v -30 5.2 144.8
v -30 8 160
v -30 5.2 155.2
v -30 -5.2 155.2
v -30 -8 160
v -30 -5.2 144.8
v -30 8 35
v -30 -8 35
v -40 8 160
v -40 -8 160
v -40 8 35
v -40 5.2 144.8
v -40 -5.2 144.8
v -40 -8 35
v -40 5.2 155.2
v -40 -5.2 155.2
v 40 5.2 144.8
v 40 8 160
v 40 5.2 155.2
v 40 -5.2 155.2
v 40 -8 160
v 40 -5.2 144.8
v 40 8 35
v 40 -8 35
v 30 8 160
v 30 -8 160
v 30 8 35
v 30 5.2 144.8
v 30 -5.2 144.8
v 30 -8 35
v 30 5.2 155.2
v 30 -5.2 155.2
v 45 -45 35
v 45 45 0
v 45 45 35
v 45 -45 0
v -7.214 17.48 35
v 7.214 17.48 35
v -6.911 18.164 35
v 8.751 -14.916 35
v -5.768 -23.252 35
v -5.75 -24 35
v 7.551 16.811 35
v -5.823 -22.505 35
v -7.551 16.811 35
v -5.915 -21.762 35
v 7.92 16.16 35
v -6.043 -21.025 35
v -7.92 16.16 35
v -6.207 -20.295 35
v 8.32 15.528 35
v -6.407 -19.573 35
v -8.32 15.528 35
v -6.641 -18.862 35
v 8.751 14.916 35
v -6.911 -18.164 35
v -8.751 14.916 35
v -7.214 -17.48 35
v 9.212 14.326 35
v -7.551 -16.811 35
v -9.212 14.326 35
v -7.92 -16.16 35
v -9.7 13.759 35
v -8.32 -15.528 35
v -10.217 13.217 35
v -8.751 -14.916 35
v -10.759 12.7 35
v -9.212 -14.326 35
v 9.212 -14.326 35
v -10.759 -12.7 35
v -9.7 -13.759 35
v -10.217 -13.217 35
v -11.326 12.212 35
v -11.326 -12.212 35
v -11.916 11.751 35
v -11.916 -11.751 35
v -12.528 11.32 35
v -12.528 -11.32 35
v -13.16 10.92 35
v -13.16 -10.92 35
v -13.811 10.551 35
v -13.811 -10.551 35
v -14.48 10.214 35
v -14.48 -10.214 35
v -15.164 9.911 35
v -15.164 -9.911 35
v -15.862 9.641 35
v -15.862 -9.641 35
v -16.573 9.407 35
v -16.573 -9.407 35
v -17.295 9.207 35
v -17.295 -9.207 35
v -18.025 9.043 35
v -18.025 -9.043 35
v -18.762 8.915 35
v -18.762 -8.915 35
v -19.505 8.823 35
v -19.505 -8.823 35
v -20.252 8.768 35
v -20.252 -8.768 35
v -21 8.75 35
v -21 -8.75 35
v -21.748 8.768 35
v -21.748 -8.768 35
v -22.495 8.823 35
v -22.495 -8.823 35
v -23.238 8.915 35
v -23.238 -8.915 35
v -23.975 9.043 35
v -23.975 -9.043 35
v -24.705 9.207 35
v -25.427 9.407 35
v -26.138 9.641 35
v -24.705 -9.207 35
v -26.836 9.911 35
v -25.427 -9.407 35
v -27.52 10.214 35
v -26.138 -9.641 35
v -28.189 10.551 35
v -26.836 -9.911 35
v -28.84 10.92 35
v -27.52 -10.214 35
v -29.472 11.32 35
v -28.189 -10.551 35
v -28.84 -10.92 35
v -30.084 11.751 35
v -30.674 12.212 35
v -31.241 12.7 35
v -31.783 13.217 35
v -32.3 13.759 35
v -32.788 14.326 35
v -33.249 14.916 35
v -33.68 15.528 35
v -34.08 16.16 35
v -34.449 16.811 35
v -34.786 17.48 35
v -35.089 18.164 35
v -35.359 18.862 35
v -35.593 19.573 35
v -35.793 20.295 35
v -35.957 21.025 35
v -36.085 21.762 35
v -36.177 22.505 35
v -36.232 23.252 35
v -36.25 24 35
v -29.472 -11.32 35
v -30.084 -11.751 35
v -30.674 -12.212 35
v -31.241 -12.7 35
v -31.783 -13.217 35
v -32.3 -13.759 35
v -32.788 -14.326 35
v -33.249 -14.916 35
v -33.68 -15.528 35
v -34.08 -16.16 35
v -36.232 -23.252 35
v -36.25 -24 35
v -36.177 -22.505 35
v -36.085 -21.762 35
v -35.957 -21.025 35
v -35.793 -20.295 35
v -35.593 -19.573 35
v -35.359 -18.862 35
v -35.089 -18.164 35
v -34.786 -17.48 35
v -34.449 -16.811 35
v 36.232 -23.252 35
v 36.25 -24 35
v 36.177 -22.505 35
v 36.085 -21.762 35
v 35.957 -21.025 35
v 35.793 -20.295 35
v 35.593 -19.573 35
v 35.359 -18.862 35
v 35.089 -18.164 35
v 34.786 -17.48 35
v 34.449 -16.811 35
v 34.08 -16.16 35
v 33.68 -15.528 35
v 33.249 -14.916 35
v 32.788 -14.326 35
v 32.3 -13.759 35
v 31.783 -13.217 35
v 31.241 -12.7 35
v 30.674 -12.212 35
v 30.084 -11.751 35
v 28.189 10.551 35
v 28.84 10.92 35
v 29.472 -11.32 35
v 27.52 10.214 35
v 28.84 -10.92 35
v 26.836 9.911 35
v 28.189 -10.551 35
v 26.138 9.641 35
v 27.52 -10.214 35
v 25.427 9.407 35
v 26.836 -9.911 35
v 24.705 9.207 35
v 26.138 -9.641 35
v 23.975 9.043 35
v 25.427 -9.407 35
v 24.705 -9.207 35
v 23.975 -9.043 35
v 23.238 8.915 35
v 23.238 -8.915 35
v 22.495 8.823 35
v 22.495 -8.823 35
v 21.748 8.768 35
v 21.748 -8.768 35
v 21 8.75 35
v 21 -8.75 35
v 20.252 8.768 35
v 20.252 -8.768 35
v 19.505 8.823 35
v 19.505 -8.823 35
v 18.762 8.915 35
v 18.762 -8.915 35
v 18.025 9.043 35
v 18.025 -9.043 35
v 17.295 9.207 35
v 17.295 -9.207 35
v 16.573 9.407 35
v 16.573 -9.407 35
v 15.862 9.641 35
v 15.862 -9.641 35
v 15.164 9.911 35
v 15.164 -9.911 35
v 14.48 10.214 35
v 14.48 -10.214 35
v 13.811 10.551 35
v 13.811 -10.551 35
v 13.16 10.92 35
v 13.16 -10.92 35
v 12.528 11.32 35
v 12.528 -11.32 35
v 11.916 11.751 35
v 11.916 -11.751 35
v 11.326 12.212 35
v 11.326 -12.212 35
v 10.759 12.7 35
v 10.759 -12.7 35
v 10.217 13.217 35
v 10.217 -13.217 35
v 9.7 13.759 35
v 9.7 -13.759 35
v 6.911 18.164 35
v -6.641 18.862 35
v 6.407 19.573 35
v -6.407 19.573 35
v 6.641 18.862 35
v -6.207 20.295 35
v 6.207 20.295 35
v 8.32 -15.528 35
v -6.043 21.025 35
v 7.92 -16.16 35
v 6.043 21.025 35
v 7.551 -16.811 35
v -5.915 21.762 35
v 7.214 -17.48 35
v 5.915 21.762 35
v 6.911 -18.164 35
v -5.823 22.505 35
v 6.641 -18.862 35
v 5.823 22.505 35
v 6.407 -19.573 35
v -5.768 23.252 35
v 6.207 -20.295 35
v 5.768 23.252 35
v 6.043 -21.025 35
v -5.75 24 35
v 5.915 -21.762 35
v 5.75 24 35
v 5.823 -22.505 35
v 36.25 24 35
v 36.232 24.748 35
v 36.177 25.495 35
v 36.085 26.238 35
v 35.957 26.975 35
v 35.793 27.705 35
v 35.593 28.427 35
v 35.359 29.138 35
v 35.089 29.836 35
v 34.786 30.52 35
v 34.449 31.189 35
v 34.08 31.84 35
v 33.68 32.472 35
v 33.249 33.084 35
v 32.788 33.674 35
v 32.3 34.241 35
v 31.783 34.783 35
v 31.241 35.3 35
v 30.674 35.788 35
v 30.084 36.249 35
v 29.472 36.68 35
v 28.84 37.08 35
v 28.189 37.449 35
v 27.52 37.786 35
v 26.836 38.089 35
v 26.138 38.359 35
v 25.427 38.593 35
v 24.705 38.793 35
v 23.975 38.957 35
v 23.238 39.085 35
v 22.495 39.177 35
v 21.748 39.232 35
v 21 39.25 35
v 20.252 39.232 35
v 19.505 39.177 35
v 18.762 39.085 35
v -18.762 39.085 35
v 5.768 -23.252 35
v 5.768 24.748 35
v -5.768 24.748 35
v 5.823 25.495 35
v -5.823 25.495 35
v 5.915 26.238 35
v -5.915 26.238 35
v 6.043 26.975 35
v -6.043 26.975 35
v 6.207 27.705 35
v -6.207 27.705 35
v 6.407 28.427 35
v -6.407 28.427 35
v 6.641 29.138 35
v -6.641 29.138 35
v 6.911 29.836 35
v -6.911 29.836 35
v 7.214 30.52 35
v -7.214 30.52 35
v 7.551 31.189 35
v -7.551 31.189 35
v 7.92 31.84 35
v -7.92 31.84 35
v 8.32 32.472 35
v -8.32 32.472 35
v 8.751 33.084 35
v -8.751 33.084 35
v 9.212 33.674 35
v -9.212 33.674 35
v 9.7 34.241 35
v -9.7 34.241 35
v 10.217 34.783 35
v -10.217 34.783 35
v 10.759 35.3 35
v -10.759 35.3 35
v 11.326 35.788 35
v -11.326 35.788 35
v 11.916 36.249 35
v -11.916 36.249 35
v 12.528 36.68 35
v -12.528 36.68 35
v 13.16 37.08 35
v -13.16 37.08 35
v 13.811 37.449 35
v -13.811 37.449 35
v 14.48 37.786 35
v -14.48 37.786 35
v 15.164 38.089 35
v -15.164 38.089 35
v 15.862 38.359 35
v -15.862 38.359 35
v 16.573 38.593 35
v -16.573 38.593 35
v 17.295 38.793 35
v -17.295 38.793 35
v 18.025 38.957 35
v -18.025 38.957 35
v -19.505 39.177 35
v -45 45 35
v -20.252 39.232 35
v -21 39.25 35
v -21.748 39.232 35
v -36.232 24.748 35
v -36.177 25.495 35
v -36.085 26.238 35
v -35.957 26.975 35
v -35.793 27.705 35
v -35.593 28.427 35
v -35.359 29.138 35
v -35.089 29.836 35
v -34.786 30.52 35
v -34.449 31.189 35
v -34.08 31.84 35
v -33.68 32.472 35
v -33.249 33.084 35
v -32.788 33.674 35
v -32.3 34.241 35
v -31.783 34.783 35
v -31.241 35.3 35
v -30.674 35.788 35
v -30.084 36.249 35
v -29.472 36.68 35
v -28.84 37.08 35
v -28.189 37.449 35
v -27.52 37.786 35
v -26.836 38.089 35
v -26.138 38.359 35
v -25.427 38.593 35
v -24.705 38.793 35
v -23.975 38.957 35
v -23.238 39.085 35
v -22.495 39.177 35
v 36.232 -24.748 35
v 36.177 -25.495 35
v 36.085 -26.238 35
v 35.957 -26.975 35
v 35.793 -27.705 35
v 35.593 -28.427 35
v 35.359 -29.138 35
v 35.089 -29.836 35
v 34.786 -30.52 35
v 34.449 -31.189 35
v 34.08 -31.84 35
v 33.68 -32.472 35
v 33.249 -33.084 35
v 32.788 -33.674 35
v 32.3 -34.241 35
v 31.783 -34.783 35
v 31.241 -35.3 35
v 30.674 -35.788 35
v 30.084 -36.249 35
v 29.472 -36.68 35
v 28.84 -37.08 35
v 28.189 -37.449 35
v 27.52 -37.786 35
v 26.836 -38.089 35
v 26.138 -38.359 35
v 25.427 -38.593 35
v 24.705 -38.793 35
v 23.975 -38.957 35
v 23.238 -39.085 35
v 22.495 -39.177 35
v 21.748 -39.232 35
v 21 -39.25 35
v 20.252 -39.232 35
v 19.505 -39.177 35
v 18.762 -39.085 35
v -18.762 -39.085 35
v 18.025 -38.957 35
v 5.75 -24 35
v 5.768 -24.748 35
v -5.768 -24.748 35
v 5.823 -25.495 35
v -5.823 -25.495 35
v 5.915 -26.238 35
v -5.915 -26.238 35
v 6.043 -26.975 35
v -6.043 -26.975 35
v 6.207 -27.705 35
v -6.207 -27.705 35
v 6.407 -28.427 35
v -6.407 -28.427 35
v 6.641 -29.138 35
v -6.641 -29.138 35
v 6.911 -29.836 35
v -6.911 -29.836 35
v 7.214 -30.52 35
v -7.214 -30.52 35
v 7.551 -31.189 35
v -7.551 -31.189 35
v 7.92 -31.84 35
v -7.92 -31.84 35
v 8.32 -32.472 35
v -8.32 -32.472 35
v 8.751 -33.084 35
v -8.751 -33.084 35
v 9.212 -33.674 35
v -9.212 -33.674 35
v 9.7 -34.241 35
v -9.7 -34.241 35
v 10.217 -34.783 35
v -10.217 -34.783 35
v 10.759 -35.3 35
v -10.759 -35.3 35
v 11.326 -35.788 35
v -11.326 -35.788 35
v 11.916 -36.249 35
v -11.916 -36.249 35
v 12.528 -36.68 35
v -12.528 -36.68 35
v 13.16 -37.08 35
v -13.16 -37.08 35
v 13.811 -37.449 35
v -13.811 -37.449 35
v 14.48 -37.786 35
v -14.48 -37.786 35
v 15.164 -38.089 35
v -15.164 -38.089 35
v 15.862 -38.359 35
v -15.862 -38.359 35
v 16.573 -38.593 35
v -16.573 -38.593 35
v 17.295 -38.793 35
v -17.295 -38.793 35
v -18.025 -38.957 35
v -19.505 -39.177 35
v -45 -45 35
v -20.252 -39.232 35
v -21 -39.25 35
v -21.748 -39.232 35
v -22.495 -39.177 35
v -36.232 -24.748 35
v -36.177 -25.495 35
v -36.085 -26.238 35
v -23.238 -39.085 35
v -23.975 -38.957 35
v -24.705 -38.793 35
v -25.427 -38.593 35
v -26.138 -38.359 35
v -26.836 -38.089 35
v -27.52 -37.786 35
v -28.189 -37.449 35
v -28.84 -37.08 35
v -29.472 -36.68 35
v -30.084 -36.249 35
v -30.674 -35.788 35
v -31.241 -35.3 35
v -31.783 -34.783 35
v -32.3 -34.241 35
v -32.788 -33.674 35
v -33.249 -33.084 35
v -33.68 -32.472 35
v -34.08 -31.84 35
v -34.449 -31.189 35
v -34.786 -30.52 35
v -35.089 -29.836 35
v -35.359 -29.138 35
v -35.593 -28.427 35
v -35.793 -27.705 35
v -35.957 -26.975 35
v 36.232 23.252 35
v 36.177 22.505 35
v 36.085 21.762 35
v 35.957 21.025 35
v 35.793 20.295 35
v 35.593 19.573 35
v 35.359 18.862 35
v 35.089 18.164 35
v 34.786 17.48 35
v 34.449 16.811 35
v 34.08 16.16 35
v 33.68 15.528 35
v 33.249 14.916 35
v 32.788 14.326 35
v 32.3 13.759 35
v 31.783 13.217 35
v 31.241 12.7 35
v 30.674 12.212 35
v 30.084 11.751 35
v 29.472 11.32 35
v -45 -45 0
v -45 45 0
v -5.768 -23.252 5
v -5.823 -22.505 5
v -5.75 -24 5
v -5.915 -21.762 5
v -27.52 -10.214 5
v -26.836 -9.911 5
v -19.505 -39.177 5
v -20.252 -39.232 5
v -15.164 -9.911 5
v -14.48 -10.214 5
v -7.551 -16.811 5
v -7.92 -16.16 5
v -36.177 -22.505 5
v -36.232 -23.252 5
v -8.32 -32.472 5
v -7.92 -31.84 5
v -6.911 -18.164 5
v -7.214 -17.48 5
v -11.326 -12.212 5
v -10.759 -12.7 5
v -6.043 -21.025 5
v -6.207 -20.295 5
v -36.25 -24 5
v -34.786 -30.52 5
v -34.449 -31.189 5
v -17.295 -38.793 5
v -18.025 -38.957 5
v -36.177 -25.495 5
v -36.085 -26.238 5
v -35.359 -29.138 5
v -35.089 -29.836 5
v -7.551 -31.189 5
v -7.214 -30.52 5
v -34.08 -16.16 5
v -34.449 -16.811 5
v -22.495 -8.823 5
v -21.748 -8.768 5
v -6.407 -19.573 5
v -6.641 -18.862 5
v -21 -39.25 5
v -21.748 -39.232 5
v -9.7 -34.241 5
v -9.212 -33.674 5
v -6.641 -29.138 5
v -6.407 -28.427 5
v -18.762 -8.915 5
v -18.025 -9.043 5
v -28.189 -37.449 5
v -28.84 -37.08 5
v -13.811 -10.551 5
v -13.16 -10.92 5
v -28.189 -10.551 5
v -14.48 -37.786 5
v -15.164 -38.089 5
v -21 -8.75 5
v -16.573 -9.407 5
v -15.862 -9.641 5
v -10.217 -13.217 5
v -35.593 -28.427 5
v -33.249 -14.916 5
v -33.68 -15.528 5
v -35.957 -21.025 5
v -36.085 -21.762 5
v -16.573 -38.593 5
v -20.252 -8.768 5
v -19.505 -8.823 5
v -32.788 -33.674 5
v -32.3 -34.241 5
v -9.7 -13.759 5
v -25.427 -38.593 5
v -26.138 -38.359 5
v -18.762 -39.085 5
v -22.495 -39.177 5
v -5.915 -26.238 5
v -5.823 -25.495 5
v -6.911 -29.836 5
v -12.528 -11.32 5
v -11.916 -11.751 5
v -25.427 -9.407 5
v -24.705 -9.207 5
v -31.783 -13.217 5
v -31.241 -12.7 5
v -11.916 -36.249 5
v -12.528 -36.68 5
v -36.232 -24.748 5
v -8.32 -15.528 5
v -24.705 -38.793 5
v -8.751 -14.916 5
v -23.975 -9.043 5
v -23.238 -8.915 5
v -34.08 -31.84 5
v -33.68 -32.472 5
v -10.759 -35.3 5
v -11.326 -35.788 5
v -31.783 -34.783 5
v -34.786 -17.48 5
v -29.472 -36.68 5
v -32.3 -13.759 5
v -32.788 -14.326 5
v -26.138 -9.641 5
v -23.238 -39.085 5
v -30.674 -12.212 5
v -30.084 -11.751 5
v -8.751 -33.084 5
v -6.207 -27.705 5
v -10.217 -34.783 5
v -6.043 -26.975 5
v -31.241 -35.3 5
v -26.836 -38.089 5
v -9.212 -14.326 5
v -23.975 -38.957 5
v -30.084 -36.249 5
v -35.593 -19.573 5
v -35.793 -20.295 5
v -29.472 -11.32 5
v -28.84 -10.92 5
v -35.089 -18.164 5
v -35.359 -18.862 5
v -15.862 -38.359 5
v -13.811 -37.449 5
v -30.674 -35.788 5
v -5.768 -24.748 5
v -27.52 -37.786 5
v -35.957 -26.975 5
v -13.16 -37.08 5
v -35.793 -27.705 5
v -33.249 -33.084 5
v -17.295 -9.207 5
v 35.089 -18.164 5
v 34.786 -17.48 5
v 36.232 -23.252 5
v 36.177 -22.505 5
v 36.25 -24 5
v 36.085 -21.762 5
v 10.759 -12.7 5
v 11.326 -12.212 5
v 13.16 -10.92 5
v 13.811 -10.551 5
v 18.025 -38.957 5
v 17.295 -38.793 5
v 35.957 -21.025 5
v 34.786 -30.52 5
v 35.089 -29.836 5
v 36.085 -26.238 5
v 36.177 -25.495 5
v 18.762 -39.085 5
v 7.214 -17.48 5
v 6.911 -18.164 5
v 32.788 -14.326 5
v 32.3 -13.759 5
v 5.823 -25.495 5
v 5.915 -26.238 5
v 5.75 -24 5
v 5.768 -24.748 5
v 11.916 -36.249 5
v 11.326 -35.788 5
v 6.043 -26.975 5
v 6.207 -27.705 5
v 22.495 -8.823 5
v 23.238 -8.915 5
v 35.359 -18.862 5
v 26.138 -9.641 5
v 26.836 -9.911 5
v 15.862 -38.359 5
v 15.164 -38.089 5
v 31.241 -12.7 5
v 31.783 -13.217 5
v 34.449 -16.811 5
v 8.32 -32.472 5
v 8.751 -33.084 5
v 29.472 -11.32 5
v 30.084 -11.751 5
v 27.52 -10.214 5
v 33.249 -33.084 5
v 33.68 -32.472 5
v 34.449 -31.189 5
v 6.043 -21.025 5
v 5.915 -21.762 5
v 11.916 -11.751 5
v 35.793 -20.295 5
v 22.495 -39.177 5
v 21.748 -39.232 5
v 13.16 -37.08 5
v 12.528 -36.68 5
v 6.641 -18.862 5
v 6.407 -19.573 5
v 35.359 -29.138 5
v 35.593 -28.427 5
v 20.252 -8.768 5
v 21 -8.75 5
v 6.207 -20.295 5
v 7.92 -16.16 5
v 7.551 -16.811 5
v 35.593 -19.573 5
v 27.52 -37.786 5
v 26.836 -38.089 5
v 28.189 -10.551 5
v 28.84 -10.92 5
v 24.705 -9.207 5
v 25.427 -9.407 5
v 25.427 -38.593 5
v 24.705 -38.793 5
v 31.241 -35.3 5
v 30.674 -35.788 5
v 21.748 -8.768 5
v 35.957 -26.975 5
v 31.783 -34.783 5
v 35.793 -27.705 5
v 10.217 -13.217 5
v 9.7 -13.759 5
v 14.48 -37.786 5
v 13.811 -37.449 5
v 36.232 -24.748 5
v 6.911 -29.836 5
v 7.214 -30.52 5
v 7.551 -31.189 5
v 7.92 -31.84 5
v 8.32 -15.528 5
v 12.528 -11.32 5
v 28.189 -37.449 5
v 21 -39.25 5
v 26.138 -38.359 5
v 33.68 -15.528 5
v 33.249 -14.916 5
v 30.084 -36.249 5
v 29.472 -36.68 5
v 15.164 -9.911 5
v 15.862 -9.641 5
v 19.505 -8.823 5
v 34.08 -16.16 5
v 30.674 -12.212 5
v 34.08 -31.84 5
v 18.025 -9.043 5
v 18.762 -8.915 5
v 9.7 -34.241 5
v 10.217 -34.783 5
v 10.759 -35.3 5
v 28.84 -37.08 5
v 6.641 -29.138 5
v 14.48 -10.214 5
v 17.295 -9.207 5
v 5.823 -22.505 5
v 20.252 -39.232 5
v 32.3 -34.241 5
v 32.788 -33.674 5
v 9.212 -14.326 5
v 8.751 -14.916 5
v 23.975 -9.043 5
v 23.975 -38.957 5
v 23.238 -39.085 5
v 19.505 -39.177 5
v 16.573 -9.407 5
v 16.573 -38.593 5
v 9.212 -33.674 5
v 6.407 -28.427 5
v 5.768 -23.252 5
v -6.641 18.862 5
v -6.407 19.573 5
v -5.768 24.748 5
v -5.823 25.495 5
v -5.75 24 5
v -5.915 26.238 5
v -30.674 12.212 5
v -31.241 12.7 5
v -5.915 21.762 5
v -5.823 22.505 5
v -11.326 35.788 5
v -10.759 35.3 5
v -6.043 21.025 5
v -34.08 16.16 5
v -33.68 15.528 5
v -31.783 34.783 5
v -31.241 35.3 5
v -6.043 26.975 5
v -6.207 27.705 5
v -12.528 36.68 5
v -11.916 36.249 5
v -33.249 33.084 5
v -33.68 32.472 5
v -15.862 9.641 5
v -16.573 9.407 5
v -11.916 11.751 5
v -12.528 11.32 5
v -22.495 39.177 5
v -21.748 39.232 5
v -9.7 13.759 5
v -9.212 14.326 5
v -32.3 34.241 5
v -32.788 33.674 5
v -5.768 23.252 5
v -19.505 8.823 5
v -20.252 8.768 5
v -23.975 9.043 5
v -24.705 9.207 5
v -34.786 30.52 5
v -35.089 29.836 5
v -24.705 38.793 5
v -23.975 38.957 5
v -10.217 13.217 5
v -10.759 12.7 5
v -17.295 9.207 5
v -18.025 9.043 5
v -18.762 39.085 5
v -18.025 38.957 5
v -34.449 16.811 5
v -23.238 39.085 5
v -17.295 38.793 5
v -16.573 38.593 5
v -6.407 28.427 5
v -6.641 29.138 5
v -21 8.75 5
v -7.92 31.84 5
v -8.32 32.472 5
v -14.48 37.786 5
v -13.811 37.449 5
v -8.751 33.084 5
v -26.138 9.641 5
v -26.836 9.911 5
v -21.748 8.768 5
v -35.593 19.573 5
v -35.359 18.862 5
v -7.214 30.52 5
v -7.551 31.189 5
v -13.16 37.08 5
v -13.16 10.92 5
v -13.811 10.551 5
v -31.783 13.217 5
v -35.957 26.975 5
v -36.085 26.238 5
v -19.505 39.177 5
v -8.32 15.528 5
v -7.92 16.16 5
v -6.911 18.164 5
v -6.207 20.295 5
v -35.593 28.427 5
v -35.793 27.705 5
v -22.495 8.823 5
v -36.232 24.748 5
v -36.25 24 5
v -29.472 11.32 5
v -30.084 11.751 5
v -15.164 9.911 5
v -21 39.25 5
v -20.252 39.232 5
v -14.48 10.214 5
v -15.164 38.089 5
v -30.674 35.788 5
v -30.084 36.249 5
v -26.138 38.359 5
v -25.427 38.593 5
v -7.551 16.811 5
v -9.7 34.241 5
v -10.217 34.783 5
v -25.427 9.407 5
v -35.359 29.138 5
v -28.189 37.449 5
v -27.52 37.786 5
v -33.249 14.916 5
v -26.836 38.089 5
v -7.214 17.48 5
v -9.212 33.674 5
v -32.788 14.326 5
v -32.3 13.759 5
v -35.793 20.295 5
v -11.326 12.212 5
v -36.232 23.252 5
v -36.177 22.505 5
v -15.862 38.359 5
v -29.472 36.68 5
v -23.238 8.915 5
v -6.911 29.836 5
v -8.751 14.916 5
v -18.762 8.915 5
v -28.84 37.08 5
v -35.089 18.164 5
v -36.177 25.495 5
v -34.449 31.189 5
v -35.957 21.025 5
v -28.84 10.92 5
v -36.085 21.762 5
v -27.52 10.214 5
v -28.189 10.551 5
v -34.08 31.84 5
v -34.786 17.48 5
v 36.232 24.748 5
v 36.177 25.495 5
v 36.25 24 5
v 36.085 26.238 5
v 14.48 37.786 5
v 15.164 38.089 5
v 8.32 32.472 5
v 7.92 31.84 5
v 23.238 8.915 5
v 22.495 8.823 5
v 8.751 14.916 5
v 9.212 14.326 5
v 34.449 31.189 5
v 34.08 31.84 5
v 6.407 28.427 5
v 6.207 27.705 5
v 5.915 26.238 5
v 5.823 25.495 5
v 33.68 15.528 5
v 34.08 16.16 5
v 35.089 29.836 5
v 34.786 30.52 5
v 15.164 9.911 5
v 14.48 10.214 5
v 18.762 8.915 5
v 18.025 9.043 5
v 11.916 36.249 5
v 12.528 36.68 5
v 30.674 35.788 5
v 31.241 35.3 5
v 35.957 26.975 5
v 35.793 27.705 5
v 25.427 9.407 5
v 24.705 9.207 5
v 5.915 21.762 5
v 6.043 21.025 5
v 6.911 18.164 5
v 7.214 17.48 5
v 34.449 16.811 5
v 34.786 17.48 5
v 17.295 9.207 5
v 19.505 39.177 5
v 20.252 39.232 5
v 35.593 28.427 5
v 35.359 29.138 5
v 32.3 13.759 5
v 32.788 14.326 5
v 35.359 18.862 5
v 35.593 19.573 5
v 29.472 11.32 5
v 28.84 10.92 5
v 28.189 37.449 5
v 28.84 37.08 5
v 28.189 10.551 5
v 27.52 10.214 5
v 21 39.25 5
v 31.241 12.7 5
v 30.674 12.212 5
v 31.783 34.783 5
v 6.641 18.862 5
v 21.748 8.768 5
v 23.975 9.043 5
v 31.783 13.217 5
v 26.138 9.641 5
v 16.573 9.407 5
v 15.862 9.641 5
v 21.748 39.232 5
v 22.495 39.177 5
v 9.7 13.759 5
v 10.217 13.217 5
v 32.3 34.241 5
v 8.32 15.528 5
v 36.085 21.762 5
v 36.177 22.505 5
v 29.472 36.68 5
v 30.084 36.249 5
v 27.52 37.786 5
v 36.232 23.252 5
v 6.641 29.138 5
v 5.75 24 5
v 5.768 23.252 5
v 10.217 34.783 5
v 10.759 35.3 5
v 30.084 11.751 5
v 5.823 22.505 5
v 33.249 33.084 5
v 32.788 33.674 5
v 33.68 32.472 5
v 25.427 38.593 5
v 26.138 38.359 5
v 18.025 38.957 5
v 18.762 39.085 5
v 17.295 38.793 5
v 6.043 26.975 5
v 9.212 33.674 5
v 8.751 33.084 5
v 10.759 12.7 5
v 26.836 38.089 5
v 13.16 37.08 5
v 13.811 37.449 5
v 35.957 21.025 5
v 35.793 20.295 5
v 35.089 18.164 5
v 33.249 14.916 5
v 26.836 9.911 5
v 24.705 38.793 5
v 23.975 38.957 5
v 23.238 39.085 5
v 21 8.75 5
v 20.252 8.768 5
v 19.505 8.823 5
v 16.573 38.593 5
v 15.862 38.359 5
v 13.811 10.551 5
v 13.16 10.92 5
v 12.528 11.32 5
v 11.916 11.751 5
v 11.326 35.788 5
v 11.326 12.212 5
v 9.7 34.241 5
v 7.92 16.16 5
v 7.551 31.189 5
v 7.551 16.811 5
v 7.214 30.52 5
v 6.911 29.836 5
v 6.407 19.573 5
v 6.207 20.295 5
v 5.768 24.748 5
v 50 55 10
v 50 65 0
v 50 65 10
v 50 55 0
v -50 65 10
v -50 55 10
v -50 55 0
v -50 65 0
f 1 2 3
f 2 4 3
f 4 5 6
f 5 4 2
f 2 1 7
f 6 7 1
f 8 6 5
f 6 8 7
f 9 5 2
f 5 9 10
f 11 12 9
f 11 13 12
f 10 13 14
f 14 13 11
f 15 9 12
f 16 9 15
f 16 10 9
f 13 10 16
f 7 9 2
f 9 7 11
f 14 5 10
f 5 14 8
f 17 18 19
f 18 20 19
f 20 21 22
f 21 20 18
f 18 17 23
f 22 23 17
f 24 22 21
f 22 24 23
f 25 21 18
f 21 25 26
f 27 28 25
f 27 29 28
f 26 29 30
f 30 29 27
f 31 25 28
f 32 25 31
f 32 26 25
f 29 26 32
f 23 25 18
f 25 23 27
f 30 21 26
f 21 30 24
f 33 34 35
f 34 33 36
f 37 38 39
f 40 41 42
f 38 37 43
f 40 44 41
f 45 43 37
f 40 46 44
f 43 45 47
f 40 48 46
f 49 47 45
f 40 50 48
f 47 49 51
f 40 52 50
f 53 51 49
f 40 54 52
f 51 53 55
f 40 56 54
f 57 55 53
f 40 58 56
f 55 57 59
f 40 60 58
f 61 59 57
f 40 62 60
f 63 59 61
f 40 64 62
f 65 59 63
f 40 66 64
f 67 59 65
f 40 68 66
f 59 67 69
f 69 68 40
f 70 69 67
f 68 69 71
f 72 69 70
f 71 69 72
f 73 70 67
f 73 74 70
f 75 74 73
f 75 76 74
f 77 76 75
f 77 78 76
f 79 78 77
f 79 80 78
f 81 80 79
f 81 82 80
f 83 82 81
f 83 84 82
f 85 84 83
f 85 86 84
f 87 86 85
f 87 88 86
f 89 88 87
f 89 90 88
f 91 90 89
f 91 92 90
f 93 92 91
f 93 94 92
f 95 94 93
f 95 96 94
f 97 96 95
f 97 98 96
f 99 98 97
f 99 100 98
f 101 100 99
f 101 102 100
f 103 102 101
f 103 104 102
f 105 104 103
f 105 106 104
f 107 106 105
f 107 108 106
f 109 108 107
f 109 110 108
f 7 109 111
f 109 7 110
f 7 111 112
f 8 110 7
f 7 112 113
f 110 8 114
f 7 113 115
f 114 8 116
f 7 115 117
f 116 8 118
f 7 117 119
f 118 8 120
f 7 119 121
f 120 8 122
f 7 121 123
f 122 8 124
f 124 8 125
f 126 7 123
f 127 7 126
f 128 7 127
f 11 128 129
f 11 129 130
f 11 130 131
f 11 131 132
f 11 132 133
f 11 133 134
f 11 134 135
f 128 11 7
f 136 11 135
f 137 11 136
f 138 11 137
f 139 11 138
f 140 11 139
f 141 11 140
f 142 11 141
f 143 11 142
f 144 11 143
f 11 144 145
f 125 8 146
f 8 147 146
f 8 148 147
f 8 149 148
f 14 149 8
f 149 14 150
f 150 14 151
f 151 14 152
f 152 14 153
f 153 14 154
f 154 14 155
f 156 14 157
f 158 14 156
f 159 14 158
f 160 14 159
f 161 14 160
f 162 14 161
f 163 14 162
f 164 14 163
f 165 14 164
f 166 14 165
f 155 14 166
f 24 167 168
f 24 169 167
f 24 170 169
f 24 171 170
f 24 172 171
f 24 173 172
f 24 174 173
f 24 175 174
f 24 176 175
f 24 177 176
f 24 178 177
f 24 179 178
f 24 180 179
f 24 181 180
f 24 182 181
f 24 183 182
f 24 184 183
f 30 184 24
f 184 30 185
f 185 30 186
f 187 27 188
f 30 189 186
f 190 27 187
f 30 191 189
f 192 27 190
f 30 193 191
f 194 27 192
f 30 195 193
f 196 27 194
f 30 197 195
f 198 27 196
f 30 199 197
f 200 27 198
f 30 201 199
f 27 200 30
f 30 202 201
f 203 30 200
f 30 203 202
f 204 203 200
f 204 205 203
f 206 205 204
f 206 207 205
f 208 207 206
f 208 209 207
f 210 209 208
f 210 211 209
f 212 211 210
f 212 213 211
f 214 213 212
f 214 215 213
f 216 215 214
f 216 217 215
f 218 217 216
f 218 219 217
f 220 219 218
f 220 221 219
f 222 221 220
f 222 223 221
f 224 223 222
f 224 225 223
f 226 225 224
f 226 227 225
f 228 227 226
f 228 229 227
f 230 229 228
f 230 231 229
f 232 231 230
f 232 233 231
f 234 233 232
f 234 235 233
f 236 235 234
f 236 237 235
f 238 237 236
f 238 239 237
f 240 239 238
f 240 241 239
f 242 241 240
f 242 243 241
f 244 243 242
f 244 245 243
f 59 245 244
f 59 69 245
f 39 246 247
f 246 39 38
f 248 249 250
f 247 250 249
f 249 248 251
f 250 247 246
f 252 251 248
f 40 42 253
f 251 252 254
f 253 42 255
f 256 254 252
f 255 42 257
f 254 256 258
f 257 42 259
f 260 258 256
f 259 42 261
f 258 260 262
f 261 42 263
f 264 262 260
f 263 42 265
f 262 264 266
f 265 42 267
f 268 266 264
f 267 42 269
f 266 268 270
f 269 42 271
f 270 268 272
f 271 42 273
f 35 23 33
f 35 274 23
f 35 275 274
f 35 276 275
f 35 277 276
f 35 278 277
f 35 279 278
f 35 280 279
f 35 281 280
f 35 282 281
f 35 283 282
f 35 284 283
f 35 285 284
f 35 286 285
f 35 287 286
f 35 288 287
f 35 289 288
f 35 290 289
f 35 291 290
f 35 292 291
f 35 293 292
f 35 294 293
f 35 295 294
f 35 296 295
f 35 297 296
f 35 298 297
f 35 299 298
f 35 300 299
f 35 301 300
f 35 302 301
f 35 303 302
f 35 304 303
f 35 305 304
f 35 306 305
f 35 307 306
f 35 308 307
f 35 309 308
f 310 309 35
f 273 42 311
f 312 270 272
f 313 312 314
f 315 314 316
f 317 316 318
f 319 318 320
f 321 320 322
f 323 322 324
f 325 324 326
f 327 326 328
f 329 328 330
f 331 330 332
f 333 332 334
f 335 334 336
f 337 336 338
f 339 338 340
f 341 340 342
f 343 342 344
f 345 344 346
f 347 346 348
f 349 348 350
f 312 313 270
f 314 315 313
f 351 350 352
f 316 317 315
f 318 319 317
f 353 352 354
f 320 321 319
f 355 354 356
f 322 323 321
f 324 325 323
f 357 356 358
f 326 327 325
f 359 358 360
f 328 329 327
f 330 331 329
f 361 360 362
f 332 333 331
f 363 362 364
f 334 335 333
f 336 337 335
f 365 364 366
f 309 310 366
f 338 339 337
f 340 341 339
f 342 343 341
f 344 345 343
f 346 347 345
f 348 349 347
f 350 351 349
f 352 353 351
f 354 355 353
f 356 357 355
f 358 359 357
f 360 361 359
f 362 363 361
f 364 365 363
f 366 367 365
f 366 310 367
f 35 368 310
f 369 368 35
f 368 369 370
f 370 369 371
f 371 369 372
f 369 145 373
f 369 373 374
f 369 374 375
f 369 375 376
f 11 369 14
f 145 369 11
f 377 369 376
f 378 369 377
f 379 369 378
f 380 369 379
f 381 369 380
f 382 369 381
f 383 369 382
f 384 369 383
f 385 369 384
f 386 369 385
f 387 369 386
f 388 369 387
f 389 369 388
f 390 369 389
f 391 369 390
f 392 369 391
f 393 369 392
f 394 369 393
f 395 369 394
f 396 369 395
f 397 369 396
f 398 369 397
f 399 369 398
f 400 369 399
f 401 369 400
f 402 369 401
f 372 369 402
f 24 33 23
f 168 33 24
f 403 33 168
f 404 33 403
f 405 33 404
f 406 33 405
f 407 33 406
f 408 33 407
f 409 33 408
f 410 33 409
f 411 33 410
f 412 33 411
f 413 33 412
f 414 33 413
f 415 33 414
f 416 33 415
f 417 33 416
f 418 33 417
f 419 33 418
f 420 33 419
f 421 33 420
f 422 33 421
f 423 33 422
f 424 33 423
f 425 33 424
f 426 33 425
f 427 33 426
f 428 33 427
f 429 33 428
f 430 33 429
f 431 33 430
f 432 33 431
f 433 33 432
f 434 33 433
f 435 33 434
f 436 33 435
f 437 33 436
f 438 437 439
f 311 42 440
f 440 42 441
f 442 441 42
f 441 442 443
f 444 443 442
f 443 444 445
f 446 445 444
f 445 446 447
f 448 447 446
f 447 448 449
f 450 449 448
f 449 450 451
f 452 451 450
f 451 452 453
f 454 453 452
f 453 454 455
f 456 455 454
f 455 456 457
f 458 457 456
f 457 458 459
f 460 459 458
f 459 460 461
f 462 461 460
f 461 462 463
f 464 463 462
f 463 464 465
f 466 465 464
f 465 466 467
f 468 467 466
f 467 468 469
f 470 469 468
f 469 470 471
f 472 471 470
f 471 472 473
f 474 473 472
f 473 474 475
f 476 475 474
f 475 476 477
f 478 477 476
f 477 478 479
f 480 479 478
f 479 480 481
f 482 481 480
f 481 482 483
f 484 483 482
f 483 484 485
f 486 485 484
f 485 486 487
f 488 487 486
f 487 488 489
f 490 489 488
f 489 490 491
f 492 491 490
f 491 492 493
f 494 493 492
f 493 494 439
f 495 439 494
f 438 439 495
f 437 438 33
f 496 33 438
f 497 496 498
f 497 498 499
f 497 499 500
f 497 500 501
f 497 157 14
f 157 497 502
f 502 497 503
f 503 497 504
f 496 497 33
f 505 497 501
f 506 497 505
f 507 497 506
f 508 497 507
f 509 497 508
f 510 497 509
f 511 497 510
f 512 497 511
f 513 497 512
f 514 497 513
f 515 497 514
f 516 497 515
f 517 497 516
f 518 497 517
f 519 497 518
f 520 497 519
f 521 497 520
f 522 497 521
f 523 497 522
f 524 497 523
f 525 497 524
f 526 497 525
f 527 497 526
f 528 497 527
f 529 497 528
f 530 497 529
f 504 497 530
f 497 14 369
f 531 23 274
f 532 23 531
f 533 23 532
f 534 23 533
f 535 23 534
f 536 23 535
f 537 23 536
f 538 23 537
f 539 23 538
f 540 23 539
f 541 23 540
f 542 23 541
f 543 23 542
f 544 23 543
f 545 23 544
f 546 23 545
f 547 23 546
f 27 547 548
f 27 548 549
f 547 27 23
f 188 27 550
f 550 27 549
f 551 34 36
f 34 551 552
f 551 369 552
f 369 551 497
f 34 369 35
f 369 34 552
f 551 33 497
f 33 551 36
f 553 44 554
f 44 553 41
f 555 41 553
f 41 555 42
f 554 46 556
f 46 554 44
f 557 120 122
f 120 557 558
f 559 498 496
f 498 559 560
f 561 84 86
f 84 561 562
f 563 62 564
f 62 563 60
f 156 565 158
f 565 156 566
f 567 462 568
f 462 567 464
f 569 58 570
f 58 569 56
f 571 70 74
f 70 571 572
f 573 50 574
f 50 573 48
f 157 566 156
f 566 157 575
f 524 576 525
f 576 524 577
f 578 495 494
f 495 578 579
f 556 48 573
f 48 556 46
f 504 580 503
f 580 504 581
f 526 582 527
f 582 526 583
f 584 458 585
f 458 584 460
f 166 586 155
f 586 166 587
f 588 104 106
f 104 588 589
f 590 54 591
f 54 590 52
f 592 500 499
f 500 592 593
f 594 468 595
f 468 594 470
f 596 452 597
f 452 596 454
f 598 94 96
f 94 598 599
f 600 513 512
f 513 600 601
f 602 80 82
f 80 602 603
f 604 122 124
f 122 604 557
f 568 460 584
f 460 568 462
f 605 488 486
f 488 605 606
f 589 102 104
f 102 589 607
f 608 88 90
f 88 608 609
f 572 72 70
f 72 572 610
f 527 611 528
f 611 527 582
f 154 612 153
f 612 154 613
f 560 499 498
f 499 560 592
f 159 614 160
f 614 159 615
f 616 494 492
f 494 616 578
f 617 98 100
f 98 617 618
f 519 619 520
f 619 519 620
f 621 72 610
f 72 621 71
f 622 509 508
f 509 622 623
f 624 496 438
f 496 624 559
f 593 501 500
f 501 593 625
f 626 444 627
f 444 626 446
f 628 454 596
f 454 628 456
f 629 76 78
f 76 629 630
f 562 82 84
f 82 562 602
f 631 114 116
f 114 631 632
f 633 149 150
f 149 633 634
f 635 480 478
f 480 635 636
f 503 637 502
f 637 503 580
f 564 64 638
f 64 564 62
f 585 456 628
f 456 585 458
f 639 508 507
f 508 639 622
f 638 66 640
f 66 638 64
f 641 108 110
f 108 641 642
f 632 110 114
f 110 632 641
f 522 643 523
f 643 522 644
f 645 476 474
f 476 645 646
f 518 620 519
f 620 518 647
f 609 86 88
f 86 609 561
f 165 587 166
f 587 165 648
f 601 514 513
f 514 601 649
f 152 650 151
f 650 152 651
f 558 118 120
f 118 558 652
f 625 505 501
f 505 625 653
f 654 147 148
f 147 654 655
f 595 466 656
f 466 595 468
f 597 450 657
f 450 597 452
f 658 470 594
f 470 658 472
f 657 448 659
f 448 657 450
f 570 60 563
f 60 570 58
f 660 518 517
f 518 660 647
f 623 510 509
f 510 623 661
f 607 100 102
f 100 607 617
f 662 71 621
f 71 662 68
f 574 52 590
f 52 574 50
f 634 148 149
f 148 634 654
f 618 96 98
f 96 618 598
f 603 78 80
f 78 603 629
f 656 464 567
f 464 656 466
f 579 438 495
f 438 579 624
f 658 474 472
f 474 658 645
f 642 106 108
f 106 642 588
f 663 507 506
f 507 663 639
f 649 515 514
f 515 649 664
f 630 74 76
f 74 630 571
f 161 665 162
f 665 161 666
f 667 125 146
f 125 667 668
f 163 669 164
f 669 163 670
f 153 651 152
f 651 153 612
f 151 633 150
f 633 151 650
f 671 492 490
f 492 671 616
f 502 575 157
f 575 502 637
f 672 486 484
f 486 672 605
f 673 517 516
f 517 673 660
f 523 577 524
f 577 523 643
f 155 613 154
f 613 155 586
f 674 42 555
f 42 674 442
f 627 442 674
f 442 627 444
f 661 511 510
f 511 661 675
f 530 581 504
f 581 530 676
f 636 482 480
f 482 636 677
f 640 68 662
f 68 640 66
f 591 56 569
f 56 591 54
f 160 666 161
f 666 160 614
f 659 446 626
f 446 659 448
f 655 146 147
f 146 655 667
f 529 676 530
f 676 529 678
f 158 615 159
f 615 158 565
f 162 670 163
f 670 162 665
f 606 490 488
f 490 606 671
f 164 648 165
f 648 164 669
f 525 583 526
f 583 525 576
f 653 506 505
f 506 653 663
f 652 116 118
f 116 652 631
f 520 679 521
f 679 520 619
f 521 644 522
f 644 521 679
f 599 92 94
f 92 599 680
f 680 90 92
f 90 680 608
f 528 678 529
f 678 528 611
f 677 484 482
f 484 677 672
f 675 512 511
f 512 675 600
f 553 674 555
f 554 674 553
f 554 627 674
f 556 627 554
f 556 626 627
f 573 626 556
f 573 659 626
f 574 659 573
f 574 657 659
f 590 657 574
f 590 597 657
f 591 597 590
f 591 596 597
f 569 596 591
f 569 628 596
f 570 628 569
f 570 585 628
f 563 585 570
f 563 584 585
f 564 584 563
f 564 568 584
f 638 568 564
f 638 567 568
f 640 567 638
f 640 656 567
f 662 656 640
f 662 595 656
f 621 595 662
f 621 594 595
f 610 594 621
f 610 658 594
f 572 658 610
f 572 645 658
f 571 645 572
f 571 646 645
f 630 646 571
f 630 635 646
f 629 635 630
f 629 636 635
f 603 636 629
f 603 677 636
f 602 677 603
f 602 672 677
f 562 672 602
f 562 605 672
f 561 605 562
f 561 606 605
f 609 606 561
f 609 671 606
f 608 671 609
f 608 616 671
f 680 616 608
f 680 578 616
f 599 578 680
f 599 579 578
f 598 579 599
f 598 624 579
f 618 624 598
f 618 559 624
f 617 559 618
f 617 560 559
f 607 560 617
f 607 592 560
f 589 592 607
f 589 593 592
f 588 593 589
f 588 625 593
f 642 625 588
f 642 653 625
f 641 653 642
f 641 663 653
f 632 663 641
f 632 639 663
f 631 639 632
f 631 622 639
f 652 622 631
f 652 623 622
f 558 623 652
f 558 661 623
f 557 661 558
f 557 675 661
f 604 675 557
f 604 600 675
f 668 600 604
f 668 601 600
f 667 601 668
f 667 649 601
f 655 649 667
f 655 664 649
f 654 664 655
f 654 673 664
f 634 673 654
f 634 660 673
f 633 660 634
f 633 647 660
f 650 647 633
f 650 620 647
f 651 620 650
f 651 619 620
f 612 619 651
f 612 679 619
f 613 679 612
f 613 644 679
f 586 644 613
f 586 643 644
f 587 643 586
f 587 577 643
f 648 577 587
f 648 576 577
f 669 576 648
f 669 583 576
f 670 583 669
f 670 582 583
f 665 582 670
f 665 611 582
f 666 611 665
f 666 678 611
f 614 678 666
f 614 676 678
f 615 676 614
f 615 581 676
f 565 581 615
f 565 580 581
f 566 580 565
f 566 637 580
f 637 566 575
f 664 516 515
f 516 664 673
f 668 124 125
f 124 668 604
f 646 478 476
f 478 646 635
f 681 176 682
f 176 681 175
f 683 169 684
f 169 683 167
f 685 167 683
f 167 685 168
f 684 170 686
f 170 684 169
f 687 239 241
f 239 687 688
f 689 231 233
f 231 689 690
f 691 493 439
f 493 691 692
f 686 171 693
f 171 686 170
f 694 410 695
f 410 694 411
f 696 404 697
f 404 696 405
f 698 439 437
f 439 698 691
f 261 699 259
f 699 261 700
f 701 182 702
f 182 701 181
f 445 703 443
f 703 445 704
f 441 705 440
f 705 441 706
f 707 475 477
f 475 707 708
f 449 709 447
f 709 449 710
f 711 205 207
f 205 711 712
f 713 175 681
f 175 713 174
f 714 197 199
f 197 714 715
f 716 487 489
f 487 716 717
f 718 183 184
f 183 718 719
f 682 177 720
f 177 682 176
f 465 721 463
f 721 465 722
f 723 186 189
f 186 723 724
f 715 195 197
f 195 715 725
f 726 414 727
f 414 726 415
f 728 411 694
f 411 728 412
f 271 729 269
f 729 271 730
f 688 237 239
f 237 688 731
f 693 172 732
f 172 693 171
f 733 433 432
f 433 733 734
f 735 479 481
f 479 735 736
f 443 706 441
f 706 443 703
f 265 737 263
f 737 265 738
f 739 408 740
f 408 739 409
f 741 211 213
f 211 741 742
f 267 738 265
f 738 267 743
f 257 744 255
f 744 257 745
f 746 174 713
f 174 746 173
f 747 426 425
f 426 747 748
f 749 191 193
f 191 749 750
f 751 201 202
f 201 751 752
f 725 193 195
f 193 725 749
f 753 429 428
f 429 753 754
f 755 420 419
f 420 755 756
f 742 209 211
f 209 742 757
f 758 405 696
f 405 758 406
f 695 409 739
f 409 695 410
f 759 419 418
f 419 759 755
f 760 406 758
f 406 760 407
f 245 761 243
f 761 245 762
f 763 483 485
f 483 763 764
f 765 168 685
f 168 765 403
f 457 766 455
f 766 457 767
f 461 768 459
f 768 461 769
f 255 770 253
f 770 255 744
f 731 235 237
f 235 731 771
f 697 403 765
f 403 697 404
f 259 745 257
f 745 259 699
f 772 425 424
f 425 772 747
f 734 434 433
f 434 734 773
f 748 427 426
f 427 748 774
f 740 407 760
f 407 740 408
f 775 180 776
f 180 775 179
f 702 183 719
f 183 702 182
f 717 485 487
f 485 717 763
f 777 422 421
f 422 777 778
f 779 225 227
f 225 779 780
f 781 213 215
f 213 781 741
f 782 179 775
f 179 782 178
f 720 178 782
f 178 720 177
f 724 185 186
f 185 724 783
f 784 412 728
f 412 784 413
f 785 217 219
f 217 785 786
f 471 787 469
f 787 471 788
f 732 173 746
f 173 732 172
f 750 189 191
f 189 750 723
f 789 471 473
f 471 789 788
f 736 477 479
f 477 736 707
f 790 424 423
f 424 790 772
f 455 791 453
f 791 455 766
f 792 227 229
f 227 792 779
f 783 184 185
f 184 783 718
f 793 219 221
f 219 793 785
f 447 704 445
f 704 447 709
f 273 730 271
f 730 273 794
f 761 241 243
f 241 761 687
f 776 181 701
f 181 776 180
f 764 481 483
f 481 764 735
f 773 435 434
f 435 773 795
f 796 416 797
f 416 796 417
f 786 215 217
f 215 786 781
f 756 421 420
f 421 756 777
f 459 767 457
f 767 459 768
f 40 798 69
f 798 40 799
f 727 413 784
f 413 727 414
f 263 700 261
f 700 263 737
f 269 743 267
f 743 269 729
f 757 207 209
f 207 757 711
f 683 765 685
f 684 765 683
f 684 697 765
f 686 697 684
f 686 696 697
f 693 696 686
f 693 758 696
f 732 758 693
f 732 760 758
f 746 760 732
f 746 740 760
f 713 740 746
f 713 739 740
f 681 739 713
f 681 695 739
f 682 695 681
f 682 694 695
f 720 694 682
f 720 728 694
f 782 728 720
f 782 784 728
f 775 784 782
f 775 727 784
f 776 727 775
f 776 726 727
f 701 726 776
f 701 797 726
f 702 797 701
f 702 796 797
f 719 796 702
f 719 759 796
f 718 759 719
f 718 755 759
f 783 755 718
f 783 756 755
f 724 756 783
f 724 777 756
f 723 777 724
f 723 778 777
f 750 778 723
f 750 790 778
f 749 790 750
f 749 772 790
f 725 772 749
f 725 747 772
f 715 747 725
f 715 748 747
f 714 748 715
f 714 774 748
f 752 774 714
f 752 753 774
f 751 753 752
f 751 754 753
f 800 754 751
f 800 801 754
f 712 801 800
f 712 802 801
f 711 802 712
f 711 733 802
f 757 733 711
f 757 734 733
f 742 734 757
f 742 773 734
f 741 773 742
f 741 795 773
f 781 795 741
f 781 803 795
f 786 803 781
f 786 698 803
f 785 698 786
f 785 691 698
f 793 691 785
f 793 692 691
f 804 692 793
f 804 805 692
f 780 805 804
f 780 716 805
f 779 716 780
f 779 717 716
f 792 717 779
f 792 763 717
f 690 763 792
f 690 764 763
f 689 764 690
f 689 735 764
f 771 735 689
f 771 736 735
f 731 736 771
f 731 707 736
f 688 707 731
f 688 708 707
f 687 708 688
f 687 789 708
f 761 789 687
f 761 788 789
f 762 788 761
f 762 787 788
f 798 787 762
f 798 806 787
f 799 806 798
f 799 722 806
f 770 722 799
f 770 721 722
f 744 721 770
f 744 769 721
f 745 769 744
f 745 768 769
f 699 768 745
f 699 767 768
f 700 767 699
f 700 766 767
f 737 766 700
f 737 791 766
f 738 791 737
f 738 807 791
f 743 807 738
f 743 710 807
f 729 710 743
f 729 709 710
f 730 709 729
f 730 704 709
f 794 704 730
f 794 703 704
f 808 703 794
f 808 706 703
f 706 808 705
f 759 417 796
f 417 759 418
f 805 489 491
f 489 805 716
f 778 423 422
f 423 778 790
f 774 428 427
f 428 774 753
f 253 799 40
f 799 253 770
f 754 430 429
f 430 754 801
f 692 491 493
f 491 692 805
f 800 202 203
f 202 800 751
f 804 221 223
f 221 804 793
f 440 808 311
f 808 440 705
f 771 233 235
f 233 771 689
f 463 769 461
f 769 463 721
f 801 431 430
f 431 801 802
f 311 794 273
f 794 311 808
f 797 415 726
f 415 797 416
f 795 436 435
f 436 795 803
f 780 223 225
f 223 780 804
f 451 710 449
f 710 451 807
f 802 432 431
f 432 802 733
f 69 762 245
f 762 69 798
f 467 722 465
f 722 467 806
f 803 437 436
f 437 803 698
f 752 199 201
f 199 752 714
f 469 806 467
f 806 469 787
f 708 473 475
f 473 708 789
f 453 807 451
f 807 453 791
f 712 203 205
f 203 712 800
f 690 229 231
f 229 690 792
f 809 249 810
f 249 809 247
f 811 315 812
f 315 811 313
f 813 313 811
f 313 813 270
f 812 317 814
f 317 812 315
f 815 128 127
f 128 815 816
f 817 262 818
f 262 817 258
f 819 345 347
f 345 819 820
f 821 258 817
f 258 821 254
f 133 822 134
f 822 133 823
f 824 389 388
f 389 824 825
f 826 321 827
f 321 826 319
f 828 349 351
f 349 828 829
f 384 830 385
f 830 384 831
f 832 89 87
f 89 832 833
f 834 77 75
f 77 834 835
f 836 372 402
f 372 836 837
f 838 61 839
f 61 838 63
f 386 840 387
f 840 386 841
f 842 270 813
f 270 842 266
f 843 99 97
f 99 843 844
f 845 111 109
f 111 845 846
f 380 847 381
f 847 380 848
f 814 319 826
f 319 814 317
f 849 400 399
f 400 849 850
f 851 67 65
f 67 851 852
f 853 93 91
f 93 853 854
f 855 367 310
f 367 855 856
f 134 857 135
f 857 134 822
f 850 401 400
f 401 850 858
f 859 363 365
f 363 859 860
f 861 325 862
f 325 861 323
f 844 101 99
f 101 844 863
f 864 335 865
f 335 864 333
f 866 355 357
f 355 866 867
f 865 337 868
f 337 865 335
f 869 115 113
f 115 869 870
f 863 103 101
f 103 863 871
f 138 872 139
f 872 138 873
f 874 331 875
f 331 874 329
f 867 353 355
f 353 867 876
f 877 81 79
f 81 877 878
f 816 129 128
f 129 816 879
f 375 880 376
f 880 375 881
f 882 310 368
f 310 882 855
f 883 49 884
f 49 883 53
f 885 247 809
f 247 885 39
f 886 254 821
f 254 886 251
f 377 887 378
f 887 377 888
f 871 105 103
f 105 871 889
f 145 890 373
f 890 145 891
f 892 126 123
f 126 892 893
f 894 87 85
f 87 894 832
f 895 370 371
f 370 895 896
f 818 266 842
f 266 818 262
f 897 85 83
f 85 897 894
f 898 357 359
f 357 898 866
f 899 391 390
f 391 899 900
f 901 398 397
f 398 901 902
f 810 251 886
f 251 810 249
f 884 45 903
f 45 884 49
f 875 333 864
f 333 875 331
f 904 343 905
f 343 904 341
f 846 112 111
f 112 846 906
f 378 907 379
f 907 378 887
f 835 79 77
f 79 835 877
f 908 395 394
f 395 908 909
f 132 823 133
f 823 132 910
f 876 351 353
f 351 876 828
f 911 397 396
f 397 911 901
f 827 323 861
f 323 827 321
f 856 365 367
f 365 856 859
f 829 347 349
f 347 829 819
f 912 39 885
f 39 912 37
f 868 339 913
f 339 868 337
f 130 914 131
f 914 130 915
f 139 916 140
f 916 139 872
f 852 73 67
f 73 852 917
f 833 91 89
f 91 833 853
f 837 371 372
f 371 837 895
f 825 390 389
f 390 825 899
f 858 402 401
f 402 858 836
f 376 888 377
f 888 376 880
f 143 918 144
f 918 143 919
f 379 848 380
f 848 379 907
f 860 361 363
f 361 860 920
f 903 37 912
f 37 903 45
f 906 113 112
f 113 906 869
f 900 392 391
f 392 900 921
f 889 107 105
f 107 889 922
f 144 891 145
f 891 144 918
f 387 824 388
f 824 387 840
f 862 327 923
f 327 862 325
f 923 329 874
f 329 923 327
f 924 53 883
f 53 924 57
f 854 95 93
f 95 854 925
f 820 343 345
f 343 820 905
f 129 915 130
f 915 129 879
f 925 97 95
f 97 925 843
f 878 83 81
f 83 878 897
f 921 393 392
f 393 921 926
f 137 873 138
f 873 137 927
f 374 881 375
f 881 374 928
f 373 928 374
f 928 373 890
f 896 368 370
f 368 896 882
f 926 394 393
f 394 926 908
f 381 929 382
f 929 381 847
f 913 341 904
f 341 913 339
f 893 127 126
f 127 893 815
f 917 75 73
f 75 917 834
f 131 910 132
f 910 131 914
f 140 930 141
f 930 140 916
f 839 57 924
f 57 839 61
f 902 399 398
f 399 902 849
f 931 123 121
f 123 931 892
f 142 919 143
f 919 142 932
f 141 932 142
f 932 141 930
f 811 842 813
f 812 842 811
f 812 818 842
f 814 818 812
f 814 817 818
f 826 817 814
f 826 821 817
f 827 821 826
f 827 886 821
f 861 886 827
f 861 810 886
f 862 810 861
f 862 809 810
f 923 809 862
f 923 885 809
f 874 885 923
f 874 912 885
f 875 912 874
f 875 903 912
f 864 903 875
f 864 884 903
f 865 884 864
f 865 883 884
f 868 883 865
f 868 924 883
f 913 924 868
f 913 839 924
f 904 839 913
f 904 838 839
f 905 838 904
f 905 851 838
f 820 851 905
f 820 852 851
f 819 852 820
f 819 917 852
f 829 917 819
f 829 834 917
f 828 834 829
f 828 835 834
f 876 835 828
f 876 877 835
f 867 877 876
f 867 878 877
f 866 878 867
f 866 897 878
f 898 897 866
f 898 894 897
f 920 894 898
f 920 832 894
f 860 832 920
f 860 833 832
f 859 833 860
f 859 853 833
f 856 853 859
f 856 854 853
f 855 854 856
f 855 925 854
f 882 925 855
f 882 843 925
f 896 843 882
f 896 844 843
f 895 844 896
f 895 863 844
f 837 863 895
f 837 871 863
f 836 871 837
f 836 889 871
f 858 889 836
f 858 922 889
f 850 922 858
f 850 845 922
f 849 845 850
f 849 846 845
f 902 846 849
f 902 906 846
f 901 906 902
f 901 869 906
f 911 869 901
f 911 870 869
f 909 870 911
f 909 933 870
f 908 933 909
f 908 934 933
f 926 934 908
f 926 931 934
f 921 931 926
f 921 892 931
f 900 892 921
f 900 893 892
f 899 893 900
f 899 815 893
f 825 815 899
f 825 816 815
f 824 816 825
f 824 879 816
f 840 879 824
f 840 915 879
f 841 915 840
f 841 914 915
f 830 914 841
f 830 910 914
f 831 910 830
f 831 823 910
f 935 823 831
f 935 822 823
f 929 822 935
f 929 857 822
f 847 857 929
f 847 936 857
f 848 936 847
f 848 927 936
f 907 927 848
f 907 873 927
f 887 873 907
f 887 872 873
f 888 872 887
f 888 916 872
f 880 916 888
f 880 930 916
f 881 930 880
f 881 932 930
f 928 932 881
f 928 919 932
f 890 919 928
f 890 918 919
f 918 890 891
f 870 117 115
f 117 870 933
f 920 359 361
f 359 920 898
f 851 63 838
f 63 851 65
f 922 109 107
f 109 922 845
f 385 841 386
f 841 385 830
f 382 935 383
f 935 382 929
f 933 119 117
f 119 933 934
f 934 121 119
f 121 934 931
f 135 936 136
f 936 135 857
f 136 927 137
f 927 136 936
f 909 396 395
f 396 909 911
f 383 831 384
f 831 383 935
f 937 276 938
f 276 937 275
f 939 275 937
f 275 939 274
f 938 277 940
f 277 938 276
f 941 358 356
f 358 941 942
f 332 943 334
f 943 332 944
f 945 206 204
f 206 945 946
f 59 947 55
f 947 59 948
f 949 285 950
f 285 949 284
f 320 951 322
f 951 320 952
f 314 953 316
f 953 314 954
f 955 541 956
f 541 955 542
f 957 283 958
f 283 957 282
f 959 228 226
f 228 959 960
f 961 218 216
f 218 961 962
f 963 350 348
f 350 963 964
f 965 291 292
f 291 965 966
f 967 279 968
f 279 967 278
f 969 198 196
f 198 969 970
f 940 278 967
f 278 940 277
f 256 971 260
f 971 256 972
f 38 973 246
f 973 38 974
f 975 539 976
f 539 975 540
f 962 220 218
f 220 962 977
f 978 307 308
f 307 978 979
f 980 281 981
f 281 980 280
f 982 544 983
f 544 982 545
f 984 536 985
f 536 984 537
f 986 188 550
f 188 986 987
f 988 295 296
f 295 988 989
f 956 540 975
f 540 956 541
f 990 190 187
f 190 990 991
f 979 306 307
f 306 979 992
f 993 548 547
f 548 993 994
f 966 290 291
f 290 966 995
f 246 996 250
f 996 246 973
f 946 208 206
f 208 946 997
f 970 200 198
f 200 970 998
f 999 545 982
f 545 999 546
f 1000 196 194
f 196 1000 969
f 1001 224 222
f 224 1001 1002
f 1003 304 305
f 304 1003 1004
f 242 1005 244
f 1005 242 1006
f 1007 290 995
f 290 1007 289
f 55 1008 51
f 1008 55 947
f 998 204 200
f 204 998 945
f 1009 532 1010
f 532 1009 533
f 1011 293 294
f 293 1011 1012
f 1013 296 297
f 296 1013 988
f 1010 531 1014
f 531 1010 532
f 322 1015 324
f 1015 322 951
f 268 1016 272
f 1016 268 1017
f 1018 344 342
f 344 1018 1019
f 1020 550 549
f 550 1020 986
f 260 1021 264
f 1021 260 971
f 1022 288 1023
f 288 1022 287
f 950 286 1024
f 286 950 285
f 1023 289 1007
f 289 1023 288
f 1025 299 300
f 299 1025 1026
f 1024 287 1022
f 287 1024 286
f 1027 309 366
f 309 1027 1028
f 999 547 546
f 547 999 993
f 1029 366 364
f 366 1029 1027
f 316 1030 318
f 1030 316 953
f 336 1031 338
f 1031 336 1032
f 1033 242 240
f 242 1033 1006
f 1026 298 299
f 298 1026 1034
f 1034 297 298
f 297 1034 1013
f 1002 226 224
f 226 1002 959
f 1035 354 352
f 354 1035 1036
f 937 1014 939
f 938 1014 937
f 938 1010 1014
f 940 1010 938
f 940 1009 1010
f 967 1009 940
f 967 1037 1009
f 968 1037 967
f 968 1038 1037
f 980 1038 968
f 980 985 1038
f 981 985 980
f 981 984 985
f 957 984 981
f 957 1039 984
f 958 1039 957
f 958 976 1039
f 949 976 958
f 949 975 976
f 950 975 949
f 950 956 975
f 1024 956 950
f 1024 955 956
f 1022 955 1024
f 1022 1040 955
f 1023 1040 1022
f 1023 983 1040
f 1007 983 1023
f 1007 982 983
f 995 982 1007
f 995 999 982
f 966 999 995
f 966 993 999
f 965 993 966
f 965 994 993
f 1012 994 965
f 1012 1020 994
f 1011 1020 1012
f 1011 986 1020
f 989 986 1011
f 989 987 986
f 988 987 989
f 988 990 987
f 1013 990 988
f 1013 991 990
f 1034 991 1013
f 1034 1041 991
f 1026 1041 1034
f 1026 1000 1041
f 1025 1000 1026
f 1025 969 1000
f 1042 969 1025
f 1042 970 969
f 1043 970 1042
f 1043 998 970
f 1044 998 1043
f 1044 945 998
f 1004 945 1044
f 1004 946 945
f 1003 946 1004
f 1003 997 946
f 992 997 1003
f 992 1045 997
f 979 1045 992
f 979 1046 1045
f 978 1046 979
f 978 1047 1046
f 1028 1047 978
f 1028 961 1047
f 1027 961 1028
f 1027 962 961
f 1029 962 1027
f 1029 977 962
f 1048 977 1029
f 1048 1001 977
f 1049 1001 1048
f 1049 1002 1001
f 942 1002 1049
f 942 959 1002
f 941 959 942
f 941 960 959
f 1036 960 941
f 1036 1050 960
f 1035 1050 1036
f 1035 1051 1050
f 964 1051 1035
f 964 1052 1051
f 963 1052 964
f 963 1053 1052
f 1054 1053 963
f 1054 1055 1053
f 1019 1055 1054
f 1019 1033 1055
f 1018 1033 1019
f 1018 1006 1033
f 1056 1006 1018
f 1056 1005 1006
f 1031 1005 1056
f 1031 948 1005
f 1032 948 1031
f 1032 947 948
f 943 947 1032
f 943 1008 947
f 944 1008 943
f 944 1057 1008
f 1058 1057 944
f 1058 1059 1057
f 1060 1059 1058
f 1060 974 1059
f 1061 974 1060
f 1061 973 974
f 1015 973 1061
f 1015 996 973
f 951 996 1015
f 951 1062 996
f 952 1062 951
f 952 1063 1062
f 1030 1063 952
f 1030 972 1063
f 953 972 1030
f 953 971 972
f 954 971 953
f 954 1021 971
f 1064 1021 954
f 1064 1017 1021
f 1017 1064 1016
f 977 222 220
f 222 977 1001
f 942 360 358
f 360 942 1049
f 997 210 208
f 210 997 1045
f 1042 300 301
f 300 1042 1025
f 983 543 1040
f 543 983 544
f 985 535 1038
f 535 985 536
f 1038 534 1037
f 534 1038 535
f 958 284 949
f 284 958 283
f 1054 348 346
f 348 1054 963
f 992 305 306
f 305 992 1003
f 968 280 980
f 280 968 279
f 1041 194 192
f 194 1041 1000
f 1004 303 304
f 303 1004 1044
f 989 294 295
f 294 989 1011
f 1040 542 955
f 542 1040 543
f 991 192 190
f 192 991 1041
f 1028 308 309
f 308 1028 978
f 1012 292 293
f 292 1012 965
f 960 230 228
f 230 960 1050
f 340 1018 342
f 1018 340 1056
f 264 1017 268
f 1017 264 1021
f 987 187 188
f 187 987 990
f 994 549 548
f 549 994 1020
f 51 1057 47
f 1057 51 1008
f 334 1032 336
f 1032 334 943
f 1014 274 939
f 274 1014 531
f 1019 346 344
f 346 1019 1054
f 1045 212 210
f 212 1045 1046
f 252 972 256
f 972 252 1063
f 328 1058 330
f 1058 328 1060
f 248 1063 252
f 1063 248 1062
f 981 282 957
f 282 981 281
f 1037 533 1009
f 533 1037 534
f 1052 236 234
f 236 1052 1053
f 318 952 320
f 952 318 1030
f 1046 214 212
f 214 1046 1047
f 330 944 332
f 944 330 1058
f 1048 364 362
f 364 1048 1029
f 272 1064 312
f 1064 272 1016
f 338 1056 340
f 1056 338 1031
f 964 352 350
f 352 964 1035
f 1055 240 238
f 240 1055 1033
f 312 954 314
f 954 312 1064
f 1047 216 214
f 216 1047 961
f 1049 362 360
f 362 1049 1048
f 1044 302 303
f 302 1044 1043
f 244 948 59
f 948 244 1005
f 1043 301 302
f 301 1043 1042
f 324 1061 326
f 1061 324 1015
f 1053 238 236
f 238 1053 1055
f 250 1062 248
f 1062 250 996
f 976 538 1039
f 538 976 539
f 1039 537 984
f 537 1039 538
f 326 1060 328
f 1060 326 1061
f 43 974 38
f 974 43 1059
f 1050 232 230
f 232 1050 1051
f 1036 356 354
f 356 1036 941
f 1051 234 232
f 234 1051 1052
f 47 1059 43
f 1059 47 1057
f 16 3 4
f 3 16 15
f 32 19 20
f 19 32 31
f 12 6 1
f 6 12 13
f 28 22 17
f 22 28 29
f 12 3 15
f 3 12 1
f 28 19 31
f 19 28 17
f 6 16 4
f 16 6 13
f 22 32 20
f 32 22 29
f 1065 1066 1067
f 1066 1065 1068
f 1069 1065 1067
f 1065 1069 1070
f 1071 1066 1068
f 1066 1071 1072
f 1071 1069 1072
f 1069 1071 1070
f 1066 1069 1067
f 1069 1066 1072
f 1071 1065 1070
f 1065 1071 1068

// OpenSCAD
// KNOWN-WRONG PART (must fail): the posts stand 5 mm in from the end faces instead of flush
// Carrier for four 50 mL conical tubes with a carrying handle; two parts printed side by side
// Category: hardware. Part 1: a base block with four blind seats and two posts with square holes
// near the top. Part 2: a square handle bar, printed lying flat, pushed through both posts.
// Print: PETG, 0.2 mm layers, 4 perimeters; the posts are tall, so print slowly near the top.
// A drop of glue (or a tight fit) keeps the bar in place.
// SPDX-License-Identifier: CERN-OHL-P-2.0

/* [Carrier] */
base = [90, 90, 35];      // X, Y, Z [mm], centred on the origin
seat_d = 30.5;            // 50 mL conical tube is ~29-30 mm across
seat_depth = 30;          // 5 mm floor
seat_pos = [[-21, -24], [21, -24], [-21, 24], [21, 24]];
post = [10, 16];          // post X, Y; flush with the X end faces, centred on y = 0
post_top = 160;
hole = 10.4;              // square hole along X for the handle bar
hole_z = 150;
bar = [100, 10, 10];      // handle bar X, Y, Z
bar_gap = 10;             // gap between the bar and the base's +Y face

/* [Hidden] */
eps = 0.01;

// part 1: carrier
difference() {
    union() {
        translate([-base.x / 2, -base.y / 2, 0]) cube(base);
        for (s = [-1, 1])
            translate([s > 0 ? base.x / 2 - post.x - 5 : -base.x / 2 + 5, -post.y / 2, base.z - eps])
                cube([post.x, post.y, post_top - base.z + eps]);
    }
    for (p = seat_pos)
        translate([p.x, p.y, base.z - seat_depth]) cylinder(d = seat_d, h = seat_depth + 1, $fn = 128);
    translate([-base.x / 2 - 1, -hole / 2, hole_z - hole / 2]) cube([base.x + 2, hole, hole]);
}
// part 2: handle bar, beside the base on the +Y side
translate([-bar.x / 2, base.y / 2 + bar_gap, 0]) cube(bar);
